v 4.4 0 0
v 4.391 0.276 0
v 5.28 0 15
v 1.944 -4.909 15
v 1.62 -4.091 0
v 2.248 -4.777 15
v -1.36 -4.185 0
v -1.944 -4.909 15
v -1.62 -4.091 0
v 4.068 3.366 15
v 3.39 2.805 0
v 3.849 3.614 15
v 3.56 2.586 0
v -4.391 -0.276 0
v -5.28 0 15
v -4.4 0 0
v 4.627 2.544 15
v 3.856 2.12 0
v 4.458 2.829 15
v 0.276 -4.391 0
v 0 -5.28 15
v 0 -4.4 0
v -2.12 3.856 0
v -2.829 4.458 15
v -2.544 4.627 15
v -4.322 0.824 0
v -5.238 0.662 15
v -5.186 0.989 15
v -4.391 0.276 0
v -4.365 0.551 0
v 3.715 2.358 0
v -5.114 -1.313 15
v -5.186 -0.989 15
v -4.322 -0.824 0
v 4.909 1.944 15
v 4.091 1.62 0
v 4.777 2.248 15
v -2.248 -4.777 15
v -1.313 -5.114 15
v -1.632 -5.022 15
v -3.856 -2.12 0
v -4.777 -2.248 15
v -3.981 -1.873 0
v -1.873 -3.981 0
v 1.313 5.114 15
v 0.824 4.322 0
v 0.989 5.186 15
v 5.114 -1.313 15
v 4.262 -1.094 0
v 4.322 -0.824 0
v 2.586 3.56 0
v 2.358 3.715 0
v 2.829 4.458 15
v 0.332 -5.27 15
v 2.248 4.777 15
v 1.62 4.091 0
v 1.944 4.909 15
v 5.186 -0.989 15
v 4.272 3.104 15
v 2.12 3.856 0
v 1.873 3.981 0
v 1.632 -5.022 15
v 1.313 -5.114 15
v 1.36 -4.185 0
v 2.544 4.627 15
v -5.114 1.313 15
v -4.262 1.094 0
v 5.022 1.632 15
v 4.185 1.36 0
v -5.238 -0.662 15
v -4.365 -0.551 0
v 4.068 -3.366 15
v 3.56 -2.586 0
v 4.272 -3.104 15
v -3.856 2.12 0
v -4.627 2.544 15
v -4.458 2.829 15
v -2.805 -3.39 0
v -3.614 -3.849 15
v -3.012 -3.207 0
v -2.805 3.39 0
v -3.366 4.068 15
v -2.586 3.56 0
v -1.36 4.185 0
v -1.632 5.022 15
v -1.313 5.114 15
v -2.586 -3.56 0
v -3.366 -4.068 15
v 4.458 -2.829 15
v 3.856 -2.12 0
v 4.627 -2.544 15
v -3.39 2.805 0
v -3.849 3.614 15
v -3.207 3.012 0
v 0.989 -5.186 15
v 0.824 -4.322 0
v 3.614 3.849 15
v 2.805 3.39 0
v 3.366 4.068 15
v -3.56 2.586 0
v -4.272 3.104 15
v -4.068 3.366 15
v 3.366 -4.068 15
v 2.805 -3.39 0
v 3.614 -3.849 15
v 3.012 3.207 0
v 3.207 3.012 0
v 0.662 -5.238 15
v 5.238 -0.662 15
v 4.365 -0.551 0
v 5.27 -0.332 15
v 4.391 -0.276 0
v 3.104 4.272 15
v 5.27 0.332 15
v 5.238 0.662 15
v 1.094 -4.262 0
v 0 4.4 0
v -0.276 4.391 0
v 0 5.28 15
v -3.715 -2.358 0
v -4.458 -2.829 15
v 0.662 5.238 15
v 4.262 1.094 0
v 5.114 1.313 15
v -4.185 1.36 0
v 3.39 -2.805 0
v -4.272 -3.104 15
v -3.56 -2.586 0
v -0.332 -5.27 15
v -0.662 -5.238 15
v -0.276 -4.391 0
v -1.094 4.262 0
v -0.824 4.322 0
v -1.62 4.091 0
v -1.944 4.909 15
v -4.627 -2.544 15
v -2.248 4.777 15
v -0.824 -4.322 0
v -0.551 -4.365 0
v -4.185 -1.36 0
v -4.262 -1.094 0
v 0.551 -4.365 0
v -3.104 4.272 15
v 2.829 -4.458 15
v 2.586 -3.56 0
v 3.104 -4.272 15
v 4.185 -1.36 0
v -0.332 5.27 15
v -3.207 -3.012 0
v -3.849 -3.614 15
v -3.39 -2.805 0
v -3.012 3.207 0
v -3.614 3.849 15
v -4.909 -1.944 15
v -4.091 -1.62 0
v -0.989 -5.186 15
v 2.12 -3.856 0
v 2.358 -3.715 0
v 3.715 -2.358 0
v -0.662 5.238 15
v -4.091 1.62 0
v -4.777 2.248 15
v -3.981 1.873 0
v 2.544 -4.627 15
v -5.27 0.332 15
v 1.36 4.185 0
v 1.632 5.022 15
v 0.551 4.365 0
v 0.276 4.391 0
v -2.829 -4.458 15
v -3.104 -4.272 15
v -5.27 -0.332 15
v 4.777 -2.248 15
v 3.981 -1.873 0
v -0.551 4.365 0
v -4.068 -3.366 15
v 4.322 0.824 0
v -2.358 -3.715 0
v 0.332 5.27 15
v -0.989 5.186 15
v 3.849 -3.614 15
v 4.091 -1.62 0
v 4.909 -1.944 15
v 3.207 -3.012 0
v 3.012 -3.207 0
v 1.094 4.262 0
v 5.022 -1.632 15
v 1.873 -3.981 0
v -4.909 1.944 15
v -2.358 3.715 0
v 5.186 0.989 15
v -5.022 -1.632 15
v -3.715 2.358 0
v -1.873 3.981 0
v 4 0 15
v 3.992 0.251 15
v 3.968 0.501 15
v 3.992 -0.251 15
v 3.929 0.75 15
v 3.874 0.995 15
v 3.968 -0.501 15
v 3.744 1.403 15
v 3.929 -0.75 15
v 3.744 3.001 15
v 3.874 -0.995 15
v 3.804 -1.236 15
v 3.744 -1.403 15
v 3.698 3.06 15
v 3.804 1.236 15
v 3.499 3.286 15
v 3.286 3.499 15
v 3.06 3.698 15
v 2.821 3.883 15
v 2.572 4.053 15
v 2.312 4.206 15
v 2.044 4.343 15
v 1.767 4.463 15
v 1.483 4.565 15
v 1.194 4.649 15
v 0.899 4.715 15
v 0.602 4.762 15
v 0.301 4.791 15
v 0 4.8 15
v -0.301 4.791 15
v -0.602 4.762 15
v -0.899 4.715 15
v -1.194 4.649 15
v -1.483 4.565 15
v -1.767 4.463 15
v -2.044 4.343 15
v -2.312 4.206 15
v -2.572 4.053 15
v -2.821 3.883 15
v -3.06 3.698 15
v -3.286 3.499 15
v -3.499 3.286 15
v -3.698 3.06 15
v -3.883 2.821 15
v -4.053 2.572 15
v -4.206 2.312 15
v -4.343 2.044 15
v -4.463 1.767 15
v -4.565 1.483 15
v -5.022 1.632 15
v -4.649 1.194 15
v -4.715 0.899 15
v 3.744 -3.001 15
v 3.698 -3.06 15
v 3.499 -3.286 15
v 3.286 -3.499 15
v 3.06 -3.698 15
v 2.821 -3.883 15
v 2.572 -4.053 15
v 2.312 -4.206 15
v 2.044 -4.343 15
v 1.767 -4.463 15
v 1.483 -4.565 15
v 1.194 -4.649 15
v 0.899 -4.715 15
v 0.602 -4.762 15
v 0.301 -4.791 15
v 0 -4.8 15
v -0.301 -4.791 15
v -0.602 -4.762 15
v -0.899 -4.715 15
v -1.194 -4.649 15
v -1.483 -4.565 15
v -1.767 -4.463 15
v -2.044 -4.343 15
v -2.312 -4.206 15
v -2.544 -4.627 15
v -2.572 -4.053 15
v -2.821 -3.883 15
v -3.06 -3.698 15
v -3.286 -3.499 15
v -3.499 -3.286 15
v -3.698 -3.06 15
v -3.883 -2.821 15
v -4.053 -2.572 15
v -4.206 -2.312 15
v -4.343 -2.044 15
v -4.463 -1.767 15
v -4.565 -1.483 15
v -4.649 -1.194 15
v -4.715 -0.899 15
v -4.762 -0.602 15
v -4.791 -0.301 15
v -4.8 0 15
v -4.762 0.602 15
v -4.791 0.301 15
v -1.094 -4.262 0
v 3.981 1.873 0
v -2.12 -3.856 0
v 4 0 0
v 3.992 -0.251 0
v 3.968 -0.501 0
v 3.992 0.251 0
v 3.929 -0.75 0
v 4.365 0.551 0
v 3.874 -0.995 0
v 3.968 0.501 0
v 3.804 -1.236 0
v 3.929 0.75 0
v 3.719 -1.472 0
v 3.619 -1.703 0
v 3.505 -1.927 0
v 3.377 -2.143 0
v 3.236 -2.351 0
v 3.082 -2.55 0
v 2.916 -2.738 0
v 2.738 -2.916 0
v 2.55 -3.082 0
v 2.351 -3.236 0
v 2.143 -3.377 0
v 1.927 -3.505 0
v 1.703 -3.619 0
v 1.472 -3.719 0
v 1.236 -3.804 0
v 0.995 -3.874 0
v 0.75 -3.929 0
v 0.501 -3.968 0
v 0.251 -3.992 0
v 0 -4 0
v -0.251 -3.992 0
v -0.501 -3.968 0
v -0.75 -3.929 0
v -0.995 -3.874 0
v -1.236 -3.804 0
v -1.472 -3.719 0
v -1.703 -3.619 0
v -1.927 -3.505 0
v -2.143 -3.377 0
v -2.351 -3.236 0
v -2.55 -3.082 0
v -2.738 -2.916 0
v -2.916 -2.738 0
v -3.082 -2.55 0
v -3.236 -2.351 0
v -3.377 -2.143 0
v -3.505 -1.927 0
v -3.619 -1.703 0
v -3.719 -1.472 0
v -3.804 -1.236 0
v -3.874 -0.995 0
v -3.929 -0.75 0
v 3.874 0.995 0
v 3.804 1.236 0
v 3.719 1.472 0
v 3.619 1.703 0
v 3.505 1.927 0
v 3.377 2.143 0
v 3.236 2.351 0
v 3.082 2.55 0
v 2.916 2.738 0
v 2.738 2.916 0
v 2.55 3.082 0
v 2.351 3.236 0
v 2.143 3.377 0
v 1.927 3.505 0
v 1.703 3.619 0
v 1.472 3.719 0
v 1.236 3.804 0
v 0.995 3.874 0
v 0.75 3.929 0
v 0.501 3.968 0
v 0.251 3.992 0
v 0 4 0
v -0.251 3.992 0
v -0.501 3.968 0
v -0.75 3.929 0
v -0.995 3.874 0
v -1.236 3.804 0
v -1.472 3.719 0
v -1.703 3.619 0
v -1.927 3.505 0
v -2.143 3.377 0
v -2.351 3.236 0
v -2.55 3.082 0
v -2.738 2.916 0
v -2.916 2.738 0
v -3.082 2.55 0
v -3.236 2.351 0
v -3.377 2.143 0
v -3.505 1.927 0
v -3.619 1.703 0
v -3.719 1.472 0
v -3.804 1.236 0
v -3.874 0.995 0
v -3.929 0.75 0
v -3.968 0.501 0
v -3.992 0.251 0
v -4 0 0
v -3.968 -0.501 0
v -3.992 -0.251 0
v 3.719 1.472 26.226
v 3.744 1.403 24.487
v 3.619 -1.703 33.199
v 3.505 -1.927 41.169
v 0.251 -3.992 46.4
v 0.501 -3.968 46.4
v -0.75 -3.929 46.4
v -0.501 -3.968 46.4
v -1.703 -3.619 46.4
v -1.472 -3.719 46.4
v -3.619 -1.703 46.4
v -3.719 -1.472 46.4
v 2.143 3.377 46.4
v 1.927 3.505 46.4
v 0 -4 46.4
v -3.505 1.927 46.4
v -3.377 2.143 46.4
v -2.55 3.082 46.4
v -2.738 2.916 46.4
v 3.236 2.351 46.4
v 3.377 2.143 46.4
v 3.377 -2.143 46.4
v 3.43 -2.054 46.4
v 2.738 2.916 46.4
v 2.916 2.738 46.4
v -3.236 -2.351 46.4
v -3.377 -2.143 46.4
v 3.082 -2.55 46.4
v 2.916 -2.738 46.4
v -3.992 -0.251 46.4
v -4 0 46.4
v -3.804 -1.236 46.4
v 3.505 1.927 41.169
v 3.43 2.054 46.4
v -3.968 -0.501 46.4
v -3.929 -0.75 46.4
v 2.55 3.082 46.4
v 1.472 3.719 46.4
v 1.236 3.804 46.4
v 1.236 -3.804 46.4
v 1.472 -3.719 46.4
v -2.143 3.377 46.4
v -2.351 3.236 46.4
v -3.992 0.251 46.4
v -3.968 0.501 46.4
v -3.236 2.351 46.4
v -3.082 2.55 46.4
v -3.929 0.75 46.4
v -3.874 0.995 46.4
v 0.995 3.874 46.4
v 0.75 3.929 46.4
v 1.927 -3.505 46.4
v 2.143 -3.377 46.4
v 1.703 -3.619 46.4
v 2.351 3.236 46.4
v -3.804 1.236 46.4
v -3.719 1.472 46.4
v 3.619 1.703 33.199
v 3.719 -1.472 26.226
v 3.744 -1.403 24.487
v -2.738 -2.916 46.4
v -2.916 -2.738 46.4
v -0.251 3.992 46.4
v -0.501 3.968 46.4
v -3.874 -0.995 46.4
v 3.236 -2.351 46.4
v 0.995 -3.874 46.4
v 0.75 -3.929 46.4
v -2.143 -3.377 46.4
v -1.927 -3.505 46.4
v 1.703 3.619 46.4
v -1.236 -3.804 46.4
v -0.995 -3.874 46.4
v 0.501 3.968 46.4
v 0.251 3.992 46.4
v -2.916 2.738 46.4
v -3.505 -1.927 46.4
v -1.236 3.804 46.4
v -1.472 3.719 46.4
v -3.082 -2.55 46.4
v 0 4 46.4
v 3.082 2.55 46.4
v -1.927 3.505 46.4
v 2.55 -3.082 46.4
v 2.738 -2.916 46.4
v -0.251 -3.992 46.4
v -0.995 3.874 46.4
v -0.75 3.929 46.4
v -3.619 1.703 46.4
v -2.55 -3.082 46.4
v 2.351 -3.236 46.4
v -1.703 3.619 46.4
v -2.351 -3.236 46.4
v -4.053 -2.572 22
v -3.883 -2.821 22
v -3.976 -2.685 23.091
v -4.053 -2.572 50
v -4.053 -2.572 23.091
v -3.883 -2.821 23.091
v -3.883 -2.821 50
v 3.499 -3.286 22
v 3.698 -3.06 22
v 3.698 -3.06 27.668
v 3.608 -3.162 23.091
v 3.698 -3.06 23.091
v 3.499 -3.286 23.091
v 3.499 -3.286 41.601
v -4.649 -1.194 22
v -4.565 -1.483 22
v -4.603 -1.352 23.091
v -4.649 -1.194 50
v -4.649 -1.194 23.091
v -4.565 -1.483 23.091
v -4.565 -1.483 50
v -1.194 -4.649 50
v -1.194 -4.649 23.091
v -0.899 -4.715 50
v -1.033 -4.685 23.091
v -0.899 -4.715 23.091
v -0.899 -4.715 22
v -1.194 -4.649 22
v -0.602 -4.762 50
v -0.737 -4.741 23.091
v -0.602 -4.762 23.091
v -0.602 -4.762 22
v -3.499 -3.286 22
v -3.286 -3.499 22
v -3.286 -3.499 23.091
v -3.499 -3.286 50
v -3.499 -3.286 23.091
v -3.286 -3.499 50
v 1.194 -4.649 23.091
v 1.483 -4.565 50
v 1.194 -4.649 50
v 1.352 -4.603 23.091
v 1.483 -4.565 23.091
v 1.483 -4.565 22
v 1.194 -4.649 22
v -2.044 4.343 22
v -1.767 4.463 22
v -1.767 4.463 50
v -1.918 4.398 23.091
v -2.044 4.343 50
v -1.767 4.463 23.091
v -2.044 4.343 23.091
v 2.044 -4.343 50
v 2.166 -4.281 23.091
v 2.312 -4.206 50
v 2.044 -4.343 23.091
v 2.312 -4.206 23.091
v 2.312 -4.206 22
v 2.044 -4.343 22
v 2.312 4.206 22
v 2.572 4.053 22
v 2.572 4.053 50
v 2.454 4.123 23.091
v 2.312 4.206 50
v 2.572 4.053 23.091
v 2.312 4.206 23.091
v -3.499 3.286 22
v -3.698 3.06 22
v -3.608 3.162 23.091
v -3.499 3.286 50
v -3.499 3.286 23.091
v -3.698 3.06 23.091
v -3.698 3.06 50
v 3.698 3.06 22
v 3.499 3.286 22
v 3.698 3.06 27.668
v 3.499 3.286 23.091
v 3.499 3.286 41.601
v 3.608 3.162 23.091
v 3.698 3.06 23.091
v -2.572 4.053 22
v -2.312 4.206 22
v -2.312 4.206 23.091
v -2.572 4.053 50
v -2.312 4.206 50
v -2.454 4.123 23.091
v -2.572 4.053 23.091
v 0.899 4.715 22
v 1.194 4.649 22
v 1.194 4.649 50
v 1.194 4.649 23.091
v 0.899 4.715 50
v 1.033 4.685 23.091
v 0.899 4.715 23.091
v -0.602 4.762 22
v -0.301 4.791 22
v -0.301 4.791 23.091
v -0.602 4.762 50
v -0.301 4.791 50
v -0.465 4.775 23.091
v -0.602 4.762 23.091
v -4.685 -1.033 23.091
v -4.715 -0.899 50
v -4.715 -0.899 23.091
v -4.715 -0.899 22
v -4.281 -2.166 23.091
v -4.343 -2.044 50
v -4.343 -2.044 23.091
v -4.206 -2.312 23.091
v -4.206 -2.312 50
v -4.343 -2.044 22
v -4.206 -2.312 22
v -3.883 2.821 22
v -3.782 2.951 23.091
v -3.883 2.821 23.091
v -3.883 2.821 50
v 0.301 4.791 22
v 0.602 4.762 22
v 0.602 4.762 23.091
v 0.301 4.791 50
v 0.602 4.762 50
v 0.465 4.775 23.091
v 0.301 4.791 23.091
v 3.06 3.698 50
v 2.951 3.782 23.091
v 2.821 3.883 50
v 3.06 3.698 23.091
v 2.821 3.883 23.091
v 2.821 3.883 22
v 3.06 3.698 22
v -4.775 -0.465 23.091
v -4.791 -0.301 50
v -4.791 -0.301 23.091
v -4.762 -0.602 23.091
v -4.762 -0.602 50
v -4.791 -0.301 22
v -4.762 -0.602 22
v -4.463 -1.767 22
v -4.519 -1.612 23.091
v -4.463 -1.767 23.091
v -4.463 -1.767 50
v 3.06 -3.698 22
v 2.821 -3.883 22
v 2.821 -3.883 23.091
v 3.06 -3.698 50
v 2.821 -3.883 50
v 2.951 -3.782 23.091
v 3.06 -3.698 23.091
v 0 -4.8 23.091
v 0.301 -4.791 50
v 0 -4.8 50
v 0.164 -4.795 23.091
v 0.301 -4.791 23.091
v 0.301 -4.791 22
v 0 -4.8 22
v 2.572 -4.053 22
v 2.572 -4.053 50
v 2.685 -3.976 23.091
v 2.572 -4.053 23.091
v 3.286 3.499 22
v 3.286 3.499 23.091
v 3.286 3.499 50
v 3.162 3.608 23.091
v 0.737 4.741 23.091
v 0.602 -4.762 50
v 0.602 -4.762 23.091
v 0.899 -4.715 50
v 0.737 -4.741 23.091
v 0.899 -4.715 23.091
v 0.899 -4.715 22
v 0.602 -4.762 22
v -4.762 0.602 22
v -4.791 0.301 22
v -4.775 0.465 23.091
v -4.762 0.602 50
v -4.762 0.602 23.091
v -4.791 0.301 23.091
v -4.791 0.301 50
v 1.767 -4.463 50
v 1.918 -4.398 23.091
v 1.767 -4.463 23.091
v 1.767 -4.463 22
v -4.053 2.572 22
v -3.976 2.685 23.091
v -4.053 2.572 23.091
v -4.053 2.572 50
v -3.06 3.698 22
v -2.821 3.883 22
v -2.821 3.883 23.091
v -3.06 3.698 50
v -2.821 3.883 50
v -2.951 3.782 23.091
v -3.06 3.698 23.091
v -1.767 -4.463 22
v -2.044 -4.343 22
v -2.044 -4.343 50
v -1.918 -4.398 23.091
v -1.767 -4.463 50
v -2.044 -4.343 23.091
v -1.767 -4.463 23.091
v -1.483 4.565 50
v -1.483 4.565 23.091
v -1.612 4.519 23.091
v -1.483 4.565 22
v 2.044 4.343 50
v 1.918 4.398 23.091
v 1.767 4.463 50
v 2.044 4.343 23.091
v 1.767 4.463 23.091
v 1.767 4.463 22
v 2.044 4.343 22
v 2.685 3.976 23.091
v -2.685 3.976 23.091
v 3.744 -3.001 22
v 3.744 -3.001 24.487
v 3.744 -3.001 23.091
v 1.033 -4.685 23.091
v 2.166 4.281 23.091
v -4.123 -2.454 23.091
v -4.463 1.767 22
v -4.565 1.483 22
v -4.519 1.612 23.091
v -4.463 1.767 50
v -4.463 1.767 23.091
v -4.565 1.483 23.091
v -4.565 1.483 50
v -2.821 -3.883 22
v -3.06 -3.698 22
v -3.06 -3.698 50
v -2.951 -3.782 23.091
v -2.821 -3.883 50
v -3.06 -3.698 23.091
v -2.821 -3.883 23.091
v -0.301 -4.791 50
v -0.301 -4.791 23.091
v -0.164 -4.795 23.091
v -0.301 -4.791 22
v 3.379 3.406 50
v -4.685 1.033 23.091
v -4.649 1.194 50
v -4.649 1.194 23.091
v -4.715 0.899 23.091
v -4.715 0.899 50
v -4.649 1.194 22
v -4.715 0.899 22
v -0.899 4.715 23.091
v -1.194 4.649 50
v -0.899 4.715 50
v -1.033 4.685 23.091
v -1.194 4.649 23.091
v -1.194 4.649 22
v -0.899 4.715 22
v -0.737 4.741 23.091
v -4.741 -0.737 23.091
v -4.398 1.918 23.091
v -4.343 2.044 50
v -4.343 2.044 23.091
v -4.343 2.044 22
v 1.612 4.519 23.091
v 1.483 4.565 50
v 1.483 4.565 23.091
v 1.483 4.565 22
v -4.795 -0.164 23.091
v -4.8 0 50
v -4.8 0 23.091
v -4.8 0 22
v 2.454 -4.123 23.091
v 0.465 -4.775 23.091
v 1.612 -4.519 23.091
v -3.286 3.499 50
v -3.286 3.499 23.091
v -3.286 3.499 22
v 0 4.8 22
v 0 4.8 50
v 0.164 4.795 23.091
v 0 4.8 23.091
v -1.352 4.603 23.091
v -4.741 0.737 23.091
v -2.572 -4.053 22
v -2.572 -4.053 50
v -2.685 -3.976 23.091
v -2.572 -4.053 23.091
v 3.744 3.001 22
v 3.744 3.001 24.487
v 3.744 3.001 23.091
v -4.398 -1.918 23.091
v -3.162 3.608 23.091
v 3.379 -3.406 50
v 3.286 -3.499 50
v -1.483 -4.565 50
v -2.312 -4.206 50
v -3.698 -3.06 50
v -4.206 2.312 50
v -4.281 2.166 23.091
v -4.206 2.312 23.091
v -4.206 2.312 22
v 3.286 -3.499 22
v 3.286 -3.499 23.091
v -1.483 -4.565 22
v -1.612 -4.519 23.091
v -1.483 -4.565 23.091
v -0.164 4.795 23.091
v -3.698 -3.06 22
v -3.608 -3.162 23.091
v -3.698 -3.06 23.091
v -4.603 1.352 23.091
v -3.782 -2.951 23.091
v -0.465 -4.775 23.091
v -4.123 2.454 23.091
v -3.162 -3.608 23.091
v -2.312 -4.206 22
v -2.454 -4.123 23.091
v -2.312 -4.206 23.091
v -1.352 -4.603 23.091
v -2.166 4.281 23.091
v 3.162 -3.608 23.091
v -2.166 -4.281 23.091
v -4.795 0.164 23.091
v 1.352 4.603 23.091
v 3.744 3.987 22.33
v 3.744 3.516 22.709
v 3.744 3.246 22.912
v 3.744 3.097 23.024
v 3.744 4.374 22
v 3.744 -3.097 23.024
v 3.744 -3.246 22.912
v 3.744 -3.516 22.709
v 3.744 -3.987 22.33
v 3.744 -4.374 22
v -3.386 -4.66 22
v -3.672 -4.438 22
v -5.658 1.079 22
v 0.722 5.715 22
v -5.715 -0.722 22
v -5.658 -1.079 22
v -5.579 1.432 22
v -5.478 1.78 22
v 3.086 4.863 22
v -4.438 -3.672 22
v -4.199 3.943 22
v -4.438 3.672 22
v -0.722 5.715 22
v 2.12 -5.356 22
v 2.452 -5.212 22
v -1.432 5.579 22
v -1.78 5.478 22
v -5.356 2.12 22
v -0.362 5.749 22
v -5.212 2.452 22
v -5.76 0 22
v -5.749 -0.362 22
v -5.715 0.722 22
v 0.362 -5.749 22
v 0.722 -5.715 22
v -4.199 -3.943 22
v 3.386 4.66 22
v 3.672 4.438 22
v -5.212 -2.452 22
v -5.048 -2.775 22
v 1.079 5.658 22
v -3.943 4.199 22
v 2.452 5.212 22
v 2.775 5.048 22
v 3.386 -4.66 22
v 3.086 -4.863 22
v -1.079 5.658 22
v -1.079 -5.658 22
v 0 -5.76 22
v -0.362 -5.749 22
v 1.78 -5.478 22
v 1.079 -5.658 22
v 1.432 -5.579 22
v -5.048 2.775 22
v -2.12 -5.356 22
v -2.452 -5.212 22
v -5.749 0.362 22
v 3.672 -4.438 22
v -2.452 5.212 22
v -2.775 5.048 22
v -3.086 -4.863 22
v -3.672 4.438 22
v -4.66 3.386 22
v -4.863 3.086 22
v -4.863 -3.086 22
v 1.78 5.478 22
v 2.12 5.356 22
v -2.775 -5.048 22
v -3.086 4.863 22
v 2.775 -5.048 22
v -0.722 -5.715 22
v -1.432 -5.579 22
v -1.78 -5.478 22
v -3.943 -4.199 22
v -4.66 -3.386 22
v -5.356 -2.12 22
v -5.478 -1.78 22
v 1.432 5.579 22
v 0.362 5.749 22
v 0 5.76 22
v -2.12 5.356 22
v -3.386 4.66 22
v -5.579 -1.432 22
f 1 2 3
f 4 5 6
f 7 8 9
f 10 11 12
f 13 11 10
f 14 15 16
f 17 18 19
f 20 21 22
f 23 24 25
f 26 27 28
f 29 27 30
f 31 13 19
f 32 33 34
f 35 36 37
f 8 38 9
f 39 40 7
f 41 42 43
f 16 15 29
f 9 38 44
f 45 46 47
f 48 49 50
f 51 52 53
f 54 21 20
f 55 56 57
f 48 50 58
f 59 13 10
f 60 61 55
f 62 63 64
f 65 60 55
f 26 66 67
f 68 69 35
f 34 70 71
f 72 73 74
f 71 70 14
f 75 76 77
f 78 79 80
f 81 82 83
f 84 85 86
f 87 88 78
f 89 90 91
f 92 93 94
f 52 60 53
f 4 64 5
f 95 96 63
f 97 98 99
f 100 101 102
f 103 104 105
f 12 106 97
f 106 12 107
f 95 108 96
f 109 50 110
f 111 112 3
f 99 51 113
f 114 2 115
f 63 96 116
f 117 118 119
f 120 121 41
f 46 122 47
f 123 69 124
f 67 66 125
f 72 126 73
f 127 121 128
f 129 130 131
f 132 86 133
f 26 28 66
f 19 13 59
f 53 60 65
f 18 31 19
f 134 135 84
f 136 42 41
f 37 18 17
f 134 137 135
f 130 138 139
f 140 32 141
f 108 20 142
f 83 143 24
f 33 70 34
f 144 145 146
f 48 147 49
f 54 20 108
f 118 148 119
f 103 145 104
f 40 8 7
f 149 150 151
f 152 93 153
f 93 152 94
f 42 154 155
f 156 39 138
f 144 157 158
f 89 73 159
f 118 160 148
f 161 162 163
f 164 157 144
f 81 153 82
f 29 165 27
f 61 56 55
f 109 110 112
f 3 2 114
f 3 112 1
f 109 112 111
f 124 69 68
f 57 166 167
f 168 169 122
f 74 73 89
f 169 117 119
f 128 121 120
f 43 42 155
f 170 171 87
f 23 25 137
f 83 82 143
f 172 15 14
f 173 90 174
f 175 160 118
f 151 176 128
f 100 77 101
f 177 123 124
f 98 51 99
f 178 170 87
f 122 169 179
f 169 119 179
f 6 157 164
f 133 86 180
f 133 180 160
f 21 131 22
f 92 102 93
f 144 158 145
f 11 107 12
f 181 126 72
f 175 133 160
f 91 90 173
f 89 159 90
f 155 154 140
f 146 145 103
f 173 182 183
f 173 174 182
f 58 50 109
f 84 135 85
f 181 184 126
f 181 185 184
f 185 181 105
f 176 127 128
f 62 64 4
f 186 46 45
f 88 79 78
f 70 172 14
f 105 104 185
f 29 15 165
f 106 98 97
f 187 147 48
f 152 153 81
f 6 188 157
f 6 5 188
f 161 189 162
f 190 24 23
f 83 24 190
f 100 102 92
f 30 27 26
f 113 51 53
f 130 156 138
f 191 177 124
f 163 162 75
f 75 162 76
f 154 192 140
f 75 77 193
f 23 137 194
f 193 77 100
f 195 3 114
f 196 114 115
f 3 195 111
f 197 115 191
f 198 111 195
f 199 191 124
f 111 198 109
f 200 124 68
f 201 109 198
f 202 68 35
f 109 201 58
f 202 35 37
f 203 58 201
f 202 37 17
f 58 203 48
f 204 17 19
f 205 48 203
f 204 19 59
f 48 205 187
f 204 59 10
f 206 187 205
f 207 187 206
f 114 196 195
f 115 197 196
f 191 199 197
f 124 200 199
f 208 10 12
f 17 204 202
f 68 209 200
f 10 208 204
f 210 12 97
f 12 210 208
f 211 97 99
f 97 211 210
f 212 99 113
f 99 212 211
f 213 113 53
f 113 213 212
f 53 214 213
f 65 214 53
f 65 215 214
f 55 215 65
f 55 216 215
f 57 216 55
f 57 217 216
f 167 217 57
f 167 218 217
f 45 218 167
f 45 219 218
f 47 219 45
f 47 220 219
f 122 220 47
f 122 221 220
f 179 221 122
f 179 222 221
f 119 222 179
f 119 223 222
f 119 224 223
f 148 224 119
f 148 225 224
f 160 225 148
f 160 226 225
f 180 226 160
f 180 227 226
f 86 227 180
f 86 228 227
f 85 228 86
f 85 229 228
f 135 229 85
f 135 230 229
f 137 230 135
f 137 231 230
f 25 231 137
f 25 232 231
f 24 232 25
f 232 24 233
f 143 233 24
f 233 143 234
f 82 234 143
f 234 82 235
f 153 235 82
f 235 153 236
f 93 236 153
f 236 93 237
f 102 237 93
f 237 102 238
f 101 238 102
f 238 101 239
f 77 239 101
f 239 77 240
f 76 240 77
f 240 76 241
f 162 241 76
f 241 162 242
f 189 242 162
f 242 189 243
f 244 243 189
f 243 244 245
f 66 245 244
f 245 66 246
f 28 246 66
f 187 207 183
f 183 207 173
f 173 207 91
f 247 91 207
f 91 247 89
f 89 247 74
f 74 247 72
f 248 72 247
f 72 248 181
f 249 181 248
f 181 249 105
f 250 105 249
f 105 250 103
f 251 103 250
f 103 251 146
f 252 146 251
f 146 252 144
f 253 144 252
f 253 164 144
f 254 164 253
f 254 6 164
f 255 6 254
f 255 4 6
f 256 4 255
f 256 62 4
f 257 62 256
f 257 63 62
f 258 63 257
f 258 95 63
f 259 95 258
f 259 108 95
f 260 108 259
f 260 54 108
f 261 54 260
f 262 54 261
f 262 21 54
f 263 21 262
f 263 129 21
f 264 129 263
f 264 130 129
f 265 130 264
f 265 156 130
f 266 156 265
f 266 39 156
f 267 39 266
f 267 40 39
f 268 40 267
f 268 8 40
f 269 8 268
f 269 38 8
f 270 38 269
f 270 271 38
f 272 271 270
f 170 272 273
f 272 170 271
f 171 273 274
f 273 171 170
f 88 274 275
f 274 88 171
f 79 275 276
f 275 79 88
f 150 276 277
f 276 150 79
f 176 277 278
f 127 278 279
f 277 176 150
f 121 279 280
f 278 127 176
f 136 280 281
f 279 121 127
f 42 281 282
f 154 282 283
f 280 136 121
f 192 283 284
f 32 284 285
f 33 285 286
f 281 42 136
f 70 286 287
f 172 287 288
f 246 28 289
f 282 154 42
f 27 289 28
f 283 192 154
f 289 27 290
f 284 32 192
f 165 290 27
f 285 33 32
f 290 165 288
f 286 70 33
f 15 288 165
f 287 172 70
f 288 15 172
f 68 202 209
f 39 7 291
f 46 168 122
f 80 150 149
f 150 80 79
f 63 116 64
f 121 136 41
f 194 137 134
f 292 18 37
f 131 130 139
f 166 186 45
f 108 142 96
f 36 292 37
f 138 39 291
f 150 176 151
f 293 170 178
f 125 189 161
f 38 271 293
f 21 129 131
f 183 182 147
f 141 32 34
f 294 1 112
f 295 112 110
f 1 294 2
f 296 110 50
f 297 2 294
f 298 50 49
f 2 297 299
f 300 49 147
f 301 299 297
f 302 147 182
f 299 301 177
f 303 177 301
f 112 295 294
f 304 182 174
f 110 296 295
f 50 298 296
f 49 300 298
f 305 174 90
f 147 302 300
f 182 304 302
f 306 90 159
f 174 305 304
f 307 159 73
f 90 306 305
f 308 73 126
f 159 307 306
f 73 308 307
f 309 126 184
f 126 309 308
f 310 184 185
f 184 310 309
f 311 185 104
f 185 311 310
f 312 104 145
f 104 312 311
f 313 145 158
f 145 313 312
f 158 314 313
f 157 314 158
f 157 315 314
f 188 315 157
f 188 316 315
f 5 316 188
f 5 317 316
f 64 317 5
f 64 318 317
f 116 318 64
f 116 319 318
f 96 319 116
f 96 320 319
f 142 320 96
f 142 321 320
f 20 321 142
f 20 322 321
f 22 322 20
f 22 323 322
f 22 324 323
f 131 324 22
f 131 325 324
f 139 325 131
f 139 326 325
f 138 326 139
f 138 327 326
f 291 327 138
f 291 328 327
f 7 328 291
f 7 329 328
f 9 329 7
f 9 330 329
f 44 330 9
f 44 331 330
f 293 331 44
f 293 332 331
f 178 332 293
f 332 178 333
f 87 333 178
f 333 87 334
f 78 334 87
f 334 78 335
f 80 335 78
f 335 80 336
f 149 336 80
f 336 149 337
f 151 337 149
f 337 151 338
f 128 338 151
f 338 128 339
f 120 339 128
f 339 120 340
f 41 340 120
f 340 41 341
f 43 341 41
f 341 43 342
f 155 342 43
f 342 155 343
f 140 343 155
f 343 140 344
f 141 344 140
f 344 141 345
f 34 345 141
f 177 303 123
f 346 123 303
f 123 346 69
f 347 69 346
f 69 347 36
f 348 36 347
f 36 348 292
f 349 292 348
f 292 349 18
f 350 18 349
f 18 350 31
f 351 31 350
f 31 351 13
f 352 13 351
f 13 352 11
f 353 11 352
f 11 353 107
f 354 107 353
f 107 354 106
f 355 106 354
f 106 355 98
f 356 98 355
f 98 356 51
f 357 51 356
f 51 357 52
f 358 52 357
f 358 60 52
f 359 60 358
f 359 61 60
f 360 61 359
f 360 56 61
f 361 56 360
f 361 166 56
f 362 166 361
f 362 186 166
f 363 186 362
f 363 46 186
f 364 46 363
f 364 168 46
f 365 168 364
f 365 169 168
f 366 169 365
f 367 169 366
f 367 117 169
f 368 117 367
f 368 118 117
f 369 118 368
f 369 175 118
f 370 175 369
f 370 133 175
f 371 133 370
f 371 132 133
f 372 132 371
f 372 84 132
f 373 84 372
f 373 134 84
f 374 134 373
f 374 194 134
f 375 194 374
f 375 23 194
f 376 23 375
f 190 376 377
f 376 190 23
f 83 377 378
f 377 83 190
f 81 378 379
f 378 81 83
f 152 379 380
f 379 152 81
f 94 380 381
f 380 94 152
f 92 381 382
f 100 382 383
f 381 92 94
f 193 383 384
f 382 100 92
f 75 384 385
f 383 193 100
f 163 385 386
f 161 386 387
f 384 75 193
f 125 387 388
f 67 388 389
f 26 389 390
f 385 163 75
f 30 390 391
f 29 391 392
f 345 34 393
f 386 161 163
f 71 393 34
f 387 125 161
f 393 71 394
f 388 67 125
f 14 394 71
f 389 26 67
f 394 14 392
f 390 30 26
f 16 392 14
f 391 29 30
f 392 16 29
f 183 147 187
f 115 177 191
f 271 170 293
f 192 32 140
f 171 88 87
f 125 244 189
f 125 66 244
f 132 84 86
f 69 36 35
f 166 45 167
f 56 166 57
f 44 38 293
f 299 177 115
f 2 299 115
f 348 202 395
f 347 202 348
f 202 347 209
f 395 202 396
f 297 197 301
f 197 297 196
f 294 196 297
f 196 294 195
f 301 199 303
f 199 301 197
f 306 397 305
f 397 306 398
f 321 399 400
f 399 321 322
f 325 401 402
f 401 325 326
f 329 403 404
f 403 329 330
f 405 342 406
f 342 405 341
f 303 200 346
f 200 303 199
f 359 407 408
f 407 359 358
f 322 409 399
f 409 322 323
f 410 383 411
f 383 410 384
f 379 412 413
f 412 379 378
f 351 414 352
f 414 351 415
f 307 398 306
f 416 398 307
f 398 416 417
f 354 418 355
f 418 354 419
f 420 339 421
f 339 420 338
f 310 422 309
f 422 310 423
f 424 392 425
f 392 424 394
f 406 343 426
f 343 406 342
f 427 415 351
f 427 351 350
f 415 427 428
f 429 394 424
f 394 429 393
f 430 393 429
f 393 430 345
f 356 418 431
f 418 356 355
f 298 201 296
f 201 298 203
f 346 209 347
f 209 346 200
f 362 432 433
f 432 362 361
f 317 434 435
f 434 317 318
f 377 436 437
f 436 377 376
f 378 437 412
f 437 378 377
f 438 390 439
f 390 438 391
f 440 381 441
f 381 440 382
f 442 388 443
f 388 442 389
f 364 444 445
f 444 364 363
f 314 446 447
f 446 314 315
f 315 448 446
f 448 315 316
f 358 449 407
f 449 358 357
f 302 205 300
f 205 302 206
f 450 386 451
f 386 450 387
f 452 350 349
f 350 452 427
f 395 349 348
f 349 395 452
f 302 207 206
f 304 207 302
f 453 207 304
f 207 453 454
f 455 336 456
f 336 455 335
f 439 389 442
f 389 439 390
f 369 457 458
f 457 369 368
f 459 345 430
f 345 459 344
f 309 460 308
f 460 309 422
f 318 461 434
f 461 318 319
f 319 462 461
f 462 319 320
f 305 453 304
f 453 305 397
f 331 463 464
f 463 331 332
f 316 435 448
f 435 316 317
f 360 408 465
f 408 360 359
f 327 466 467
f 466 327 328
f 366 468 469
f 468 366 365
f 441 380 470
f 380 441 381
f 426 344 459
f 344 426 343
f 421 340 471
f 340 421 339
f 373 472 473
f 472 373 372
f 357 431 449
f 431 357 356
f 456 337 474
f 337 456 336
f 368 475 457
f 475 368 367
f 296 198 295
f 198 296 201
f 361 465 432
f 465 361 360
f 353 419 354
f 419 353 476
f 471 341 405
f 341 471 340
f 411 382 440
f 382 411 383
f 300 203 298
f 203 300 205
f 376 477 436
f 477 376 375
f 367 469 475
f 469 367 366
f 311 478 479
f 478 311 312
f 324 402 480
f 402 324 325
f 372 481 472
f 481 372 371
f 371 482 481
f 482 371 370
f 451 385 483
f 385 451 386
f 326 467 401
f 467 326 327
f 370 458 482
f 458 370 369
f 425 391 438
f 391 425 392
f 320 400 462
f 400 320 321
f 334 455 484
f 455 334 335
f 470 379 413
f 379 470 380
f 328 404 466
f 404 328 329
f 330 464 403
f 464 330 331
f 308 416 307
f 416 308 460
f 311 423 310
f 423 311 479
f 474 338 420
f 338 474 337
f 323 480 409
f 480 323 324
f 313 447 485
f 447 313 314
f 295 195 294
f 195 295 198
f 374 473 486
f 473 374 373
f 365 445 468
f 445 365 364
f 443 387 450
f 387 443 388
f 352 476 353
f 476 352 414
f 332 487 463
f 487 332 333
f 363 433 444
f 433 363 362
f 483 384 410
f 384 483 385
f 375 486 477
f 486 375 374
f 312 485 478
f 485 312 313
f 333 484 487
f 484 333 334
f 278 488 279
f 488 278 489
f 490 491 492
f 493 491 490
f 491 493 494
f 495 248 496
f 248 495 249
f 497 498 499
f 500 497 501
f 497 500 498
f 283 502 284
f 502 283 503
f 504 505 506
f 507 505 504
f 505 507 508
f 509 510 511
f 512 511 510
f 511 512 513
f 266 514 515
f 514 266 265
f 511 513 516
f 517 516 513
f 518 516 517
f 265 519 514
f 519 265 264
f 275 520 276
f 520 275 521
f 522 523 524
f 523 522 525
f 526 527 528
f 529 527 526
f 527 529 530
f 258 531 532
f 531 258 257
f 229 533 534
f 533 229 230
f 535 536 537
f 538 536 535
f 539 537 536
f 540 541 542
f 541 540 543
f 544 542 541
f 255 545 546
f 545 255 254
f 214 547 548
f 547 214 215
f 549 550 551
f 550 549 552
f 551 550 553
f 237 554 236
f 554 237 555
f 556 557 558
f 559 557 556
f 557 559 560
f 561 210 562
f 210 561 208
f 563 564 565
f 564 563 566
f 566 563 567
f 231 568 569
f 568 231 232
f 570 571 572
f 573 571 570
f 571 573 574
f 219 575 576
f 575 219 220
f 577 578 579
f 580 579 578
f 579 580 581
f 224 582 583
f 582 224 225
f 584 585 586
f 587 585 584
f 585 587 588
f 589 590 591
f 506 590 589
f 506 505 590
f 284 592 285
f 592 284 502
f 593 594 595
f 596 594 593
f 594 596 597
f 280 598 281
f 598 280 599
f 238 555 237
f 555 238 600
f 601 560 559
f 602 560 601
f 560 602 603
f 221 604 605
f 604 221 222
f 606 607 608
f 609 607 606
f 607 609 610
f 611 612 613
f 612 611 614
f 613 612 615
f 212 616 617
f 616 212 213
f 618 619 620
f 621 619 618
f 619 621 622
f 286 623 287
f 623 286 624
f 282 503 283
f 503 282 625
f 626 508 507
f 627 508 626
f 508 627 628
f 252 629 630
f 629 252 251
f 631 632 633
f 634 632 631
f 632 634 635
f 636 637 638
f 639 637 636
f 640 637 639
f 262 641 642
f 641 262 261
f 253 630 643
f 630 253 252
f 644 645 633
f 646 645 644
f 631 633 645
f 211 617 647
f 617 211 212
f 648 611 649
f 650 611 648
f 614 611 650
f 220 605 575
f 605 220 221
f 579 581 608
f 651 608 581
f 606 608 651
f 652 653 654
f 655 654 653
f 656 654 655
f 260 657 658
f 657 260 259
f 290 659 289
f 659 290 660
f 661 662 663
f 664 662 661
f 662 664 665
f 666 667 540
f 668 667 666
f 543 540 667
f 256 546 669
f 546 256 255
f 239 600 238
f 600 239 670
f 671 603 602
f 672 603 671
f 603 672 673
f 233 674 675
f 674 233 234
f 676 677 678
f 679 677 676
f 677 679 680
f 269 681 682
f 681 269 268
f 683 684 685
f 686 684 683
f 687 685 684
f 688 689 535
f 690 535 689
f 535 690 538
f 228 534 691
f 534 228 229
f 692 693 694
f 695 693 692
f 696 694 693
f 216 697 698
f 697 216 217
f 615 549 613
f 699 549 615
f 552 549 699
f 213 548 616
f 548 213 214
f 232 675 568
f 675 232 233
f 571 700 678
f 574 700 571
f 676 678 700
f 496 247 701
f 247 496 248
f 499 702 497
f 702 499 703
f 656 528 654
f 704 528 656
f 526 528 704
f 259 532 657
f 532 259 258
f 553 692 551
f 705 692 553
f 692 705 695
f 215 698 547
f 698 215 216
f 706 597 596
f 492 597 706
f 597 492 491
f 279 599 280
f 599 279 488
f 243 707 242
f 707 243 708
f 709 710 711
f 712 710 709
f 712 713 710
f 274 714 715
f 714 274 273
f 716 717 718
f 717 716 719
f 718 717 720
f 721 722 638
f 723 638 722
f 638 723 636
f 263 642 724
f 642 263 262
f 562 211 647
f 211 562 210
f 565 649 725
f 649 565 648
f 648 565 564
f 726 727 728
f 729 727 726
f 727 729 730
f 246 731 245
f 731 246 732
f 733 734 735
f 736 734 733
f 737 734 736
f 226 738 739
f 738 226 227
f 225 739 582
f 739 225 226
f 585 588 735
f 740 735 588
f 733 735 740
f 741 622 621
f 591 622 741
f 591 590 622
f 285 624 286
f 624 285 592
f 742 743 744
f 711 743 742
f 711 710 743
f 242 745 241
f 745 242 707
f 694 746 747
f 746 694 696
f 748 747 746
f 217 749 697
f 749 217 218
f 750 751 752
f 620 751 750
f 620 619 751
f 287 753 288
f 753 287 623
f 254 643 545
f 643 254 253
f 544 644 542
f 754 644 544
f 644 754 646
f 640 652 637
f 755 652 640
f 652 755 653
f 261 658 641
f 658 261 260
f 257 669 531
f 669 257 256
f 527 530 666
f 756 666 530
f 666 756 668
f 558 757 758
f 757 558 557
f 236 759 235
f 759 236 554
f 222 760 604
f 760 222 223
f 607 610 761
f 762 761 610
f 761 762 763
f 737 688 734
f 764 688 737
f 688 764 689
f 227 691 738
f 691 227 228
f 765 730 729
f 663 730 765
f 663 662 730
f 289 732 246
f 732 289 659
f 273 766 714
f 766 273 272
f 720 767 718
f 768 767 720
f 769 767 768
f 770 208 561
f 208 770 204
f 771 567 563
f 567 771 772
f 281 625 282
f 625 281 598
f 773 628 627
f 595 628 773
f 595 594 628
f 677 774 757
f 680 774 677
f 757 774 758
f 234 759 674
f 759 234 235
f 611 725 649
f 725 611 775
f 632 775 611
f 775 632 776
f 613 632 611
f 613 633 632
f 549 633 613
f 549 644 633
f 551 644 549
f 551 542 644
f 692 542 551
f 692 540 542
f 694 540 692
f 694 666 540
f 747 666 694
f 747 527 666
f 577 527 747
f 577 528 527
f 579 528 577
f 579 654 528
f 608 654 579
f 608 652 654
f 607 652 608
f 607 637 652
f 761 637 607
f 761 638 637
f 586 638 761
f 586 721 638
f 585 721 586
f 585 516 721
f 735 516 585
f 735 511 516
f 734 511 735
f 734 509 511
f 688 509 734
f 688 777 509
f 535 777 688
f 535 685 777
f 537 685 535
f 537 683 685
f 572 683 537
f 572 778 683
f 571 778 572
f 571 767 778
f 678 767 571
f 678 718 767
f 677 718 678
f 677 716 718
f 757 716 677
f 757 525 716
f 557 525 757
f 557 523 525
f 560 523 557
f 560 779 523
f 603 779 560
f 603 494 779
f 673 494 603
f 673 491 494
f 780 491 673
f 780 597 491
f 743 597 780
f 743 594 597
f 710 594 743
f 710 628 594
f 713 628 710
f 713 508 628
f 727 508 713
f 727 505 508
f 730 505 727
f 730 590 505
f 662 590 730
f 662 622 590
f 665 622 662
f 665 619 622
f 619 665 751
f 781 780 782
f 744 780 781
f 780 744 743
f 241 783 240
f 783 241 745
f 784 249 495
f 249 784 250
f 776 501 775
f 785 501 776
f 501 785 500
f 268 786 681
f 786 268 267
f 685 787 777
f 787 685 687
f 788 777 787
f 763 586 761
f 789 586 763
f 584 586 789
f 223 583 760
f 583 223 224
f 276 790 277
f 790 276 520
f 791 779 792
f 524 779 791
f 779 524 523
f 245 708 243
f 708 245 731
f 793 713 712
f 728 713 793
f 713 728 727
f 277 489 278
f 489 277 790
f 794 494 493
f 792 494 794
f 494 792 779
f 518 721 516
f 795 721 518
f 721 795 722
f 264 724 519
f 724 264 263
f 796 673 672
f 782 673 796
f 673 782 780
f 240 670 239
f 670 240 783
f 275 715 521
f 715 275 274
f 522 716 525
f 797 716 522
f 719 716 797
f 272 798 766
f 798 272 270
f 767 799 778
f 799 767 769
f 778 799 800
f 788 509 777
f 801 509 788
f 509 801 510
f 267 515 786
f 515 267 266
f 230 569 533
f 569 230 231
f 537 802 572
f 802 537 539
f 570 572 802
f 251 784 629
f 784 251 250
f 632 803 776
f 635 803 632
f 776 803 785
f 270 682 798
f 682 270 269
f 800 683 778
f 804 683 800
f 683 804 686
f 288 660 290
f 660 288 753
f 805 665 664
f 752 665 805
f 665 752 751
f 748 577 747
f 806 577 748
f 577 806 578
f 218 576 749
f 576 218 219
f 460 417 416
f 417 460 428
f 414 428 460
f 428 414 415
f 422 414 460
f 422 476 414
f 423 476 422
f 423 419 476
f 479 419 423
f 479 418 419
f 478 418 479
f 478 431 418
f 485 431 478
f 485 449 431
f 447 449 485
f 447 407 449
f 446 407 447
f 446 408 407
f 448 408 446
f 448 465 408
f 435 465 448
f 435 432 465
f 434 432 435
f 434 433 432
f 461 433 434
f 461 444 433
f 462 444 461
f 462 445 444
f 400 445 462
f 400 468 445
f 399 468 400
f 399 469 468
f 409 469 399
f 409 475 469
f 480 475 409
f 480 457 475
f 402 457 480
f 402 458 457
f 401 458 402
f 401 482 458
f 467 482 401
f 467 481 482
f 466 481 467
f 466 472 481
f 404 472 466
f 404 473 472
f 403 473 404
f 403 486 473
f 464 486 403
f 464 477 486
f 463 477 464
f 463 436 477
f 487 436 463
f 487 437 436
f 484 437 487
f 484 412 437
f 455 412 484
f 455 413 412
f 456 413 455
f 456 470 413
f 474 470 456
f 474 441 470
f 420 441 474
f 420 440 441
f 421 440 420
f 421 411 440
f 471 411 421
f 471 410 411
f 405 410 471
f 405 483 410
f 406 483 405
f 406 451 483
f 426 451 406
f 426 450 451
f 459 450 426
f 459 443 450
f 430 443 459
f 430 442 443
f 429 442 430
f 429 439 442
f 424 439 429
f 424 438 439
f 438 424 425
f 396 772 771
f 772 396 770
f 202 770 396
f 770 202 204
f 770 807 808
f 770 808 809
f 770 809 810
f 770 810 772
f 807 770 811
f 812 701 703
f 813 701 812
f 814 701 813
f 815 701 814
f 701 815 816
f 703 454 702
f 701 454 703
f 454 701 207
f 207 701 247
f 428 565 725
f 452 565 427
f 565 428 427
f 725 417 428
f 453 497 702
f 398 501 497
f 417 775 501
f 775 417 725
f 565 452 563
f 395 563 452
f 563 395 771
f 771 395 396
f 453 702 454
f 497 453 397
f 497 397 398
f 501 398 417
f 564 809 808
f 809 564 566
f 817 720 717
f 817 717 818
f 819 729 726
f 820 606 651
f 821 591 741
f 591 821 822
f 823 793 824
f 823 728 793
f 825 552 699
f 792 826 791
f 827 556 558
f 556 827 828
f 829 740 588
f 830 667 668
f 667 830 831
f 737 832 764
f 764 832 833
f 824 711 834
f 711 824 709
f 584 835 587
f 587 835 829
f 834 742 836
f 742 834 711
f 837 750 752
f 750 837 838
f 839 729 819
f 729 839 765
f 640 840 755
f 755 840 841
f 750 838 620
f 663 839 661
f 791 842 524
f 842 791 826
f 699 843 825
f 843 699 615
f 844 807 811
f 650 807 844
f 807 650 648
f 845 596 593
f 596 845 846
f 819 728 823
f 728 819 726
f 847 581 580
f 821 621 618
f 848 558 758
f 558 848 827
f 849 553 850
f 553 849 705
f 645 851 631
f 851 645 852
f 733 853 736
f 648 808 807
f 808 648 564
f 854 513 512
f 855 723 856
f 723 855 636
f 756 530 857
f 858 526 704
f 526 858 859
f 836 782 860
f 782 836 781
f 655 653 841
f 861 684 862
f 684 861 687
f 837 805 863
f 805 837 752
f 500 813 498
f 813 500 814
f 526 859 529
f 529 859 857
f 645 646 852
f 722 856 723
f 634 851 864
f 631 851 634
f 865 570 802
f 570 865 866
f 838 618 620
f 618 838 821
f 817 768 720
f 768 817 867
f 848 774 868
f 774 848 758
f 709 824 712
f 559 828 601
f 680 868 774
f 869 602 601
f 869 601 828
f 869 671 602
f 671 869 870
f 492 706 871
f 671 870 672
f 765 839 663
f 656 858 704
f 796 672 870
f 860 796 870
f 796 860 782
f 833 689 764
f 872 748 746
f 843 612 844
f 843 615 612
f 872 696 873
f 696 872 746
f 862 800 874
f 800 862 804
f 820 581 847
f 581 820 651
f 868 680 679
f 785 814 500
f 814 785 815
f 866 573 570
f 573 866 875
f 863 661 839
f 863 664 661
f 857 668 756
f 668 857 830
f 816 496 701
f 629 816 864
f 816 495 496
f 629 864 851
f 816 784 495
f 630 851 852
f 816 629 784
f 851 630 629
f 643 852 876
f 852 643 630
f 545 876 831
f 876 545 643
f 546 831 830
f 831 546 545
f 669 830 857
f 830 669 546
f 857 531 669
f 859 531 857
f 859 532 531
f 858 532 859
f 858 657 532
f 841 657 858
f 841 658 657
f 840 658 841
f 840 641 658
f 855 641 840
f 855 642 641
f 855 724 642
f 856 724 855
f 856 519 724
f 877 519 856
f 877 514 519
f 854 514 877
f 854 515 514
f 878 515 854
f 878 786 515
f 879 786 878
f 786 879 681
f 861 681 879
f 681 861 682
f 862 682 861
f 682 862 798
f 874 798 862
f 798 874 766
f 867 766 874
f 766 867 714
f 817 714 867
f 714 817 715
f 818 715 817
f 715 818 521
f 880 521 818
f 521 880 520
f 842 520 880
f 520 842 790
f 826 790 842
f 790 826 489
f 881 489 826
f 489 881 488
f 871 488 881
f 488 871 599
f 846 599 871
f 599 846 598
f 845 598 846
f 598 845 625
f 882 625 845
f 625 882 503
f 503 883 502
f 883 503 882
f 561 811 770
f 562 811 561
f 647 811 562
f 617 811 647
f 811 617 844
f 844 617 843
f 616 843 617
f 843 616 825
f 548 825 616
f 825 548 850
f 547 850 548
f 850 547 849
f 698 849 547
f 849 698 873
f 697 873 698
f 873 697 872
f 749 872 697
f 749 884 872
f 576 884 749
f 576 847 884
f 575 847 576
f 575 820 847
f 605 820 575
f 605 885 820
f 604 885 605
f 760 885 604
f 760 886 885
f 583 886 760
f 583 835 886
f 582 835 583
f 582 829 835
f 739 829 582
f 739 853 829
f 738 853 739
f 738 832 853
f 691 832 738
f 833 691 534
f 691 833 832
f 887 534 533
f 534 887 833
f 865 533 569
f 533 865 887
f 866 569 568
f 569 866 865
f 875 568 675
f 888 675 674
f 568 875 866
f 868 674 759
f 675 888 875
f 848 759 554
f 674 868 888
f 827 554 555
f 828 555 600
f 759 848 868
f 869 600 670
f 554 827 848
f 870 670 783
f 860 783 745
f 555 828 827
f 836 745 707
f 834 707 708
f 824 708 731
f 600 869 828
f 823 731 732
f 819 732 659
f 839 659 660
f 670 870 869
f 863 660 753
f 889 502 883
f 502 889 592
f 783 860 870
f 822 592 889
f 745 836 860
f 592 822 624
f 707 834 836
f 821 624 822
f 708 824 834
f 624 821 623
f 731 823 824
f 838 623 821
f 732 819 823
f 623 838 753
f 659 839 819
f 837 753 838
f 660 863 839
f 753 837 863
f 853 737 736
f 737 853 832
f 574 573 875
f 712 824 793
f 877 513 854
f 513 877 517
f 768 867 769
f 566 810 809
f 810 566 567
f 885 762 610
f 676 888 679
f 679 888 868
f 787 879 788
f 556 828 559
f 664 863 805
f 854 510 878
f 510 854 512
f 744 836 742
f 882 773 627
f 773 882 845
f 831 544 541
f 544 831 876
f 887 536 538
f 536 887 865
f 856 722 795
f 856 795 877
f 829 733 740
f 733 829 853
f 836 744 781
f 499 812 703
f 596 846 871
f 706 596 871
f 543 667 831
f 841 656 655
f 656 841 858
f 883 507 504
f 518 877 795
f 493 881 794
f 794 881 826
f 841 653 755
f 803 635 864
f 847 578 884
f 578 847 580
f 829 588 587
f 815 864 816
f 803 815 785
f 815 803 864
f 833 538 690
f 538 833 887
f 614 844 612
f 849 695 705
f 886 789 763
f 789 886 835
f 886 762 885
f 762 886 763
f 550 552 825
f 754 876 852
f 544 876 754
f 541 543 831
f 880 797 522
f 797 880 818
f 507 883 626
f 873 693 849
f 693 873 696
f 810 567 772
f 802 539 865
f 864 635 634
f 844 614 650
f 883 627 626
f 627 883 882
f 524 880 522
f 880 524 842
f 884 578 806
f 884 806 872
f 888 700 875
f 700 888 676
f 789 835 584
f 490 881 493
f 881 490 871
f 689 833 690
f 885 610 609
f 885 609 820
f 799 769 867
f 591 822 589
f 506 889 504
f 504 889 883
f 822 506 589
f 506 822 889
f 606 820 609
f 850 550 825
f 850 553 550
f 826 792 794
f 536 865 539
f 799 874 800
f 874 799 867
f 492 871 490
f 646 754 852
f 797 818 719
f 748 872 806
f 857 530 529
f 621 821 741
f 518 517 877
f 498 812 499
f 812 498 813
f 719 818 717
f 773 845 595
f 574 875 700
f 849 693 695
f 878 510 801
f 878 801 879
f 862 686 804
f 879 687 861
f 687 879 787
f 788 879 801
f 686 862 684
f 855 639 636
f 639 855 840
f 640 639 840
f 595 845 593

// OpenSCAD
// file: reed/BOSL2/std.scad
// Minimal BOSL2 compatibility shim for bundled gallery models.
// It implements only the helpers used by the imported OpenSCAD projects.

CENTER = [0, 0, 0];
BOTTOM = [0, 0, -1];
TOP = [0, 0, 1];
LEFT = [-1, 0, 0];
RIGHT = [1, 0, 0];
FRONT = [0, -1, 0];
BACK = [0, 1, 0];

module up(z=0) {
    translate([0, 0, z]) children();
}

module down(z=0) {
    translate([0, 0, -z]) children();
}

module attach(anchor=CENTER) {
    children();
}

module cuboid(size=[1, 1, 1], anchor=CENTER) {
    center = anchor == CENTER;
    translate(center ? [0, 0, 0] : [0, 0, size[2] / 2])
        cube(size, center=true);
    children();
}

module xcyl(h=1, r=1, anchor=CENTER) {
    center = anchor == CENTER;
    translate(center ? [0, 0, 0] : [h / 2, 0, 0])
        rotate([0, 90, 0])
            cylinder(h=h, r=r, center=true);
}
// file: reed/reed.scad
use <BOSL2/std.scad>

holder_completeness_percent = 33;

module pipe(length, outer_diameter, thickness, cap=0, center=true){
    if(cap == 0){
        difference(){
            cylinder(h=length, d=outer_diameter, center = center);
            translate([0,0,-0.1*length]) cylinder(h=length*1.3, d=outer_diameter-thickness*2, center = center);
        }
    } else {
        difference(){
            cylinder(h=length, d=outer_diameter, center = center);
            translate([0,0,-cap]) cylinder(h=length, d=outer_diameter-thickness*2, center = center);
        }
    }
}

module partial_pipe(length, outer_diameter, thickness, completeness_percent=33){
    echo(str("partial_pipe(", length, ", ", outer_diameter, ", ", thickness, ", ", completeness_percent));
    difference(){
        rotate_extrude(angle=completeness_percent*360/100, convexity = 2){
            translate([0.01, 0, 0]) square([outer_diameter/2 - 0.01, length], center = false);
        }
        translate([0,0,-0.1*length]) cylinder(h=length*1.2,d=outer_diameter - thickness*2, center = false);
    }
}

module reed_burdon_ending(total_length, end_length, d) {
    // pogrubienie przy mocowaniu
    translate([0,0,-end_length]){
        flute_count = 5;
        union() {
            difference() { // stożek
                cylinder(h=end_length,r2=d/2,r1=d/2*0.75,center=false);
                translate([0,0,-end_length*0.05]) cylinder(h=end_length*1.1,r2=d/2*0.8,r1=d/2*0.65,center=false);
            }
            // for(i=[1:flute_count]){ //karbowanie
            //     translate([0,0,(i-1)*end_length/flute_count]){
            //         pipe(length=end_length/flute_count/2, outer_diameter=d*lerp(0.80, 1.1, i/flute_count), thickness=0.6, center=false);
            //         // echo(i*end_length/flute_count);
            //     }
            // } //karby
        } // karbowanie
    } // pogrubienie
}

module reed_ending(total_length, end_length, d) {
    wall_thickness = d * 0.11;
    translate([0,0,-end_length]){
        flute_count = 5;
        union() {
            difference() { // stożek
                cylinder(h=end_length,r1=d/2-wall_thickness+0.4,r2=d/2);
                translate([0,0,-end_length*0.05]) cylinder(h=end_length*1.1,r1=d/2-wall_thickness,r2=d/2-wall_thickness);
            }
            // for(i=[1:flute_count]){ //karbowanie
            //     translate([0,0,(i-1)*end_length/flute_count]){
            //         pipe(length=end_length/flute_count/2, outer_diameter=d+2*wall_thickness, thickness=0.6, center=false);
            //         // echo(i*end_length/flute_count);
            //     }
            // } //karby
        } // karbowanie
    } // pogrubienie
}

module reed_base(total_length, end_length, d){
    translate([0, 0, end_length]) {
        // główny cylinder
        cylinder(h=total_length - end_length, d=d);
        reed_ending(total_length, end_length, d);
    } // wyrównanie po dodaniu końcówki
}
// file: variants-reed-pipe.scad
variants_reed_pipe_length = 50;
variants_reed_pipe_fastener_length = variants_reed_pipe_length * 0.13;
variants_reed_pipe_end_length = 15;
variants_reed_pipe_in_diameter = 8;
variants_reed_pipe_wall_thickness = 0.8;
variants_reed_pipe_cut_prcnt = 11;
variants_reed_pipe_leaf_degree = 1.64; // had a case when the leaf curled up, and become too difficult to play. 1.66 gives lower tone!


// leaf only
// variants_leaf_thickness = 0.4;
variants_leaf_enforcement_square_coeff = 0.000;
variants_leaf_enforcement_linear_coeff = 0.04;
variants_leaf_enforcement_const_coeff = 0.4;
variants_leaf_enforcement_support_stem_height = 0;
// file: reed/reed_2_0_0.scad
include <reed.scad>

completeness_percent = 25;
wall_thickness = 0.8;
reed_plug_overhang_suppressor_len = 2;
eps = 0.01;

module reed_plug(total_length, end_length, d) {
    d_out = d+wall_thickness*2;

    translate([0,0,-end_length]){
        difference() {
            cylinder(h=end_length,d2=d_out*1.1,d1=d+0.8);
            translate([0,0,-eps/2]) cylinder(h=end_length+eps,d=d);
        }
    }

    // // anti overhanger
    // translate([0,0,0]) {
    //     difference() {
    //         cylinder(h=reed_plug_overhang_suppressor_len,d1=d_out*1.1,d2=d+0.8);
    //         translate([0,0,-eps/2]) cylinder(h=2+eps,d=d);
    //     }
    // }
}

module reed2_base(total_length, end_length, d){
    d_out = d+wall_thickness*2;
    translate([0, 0, end_length]) {
        difference() {
            cylinder(h=total_length - end_length, d=d_out);
            translate([0, 0, -0.1]) cylinder(h = (total_length - end_length)*0.9, d = d);
        }
    } 
}

module reed2_leaf_socket(heigth_cut_prcnt, d, total_length) {
    d_out = d+wall_thickness*2;
    // deepens the cut, for more secure leaf hold
    translate([-heigth_cut_prcnt/120 * d_out, 0, 0]) cube(size=[heigth_cut_prcnt/50 * d_out * 1.1, d_out*1.1, total_length * 0.1]);
}

module reed2_base_flat_cutting_cube(d, heigth_cut_prcnt, total_length) {
    d_out = d+wall_thickness*2;
    translate([d_out/2 - d_out * heigth_cut_prcnt / 100, -d_out/2, 0.25 * total_length]) {
        cube(size=[d_out, d_out, total_length * 0.80]);
        // reed2_leaf_socket(heigth_cut_prcnt, d, total_length);
    }
}

module reed2_base_flat_cut(total_length, end_length, d, heigth_cut_prcnt) {
    difference(){
        reed2_base(total_length, end_length, d);
        translate([0,0,-0.5]) reed2_base_flat_cutting_cube(d, heigth_cut_prcnt, total_length+2/*a gap for reed fitting*/);
    }
}

module reed2_cut(total_length, d, heigth_cut_prcnt, leaf_degree) {
    d_out = d+2*wall_thickness;
    translate([d_out/2 - d_out * heigth_cut_prcnt / 100 + 0.1/*<- fill the little gap between leaf and reed*/, -d_out/2, 0.35 * total_length]) {
        rotate([0, -leaf_degree, 0]) rotate([180, 90, -90]) {
            rotate_extrude(angle = leaf_degree, $fn=100) {
                rotate([0, 0, 90]) {
                    square([d_out, total_length * 0.70]);
                }
            }
        }
    }
}

module reed2_leaf(total_length, end_length, d, heigth_cut_prcnt, stem_heigth_coeff_init, stem_heigth_coeff) {
    d_out = d+2*wall_thickness;
    leaf_len = (total_length - end_length)*0.9;
    
    // trunk of the leaf ;)
    translate([-d*0.15,0,0]) intersection(){
        cylinder(h=total_length * 0.94, d=d_out*1.25);
        reed2_base_flat_cutting_cube(d_out, heigth_cut_prcnt, total_length);
    }

    // support stem
    translate([d_out/2+leaf_len*stem_heigth_coeff_init/2-d*0.1/2, 0, end_length]) rotate([0,-atan(stem_heigth_coeff_init-stem_heigth_coeff),0]) rotate([0,0,-120]) cylinder(leaf_len, leaf_len*stem_heigth_coeff_init, leaf_len*stem_heigth_coeff, $fn=3);
    
    // text
    // translate([d/2-wall_thickness/6, d/8, end_length]) rotate([180,-90,0]) reed2_text(total_length, end_length, d, heigth_cut_prcnt, "-", wall_thickness);
    
    // // round clip
    // difference() {
    //     rotate([0,0,180-(90)/2*360/100]) translate([0,0,end_length]) partial_pipe(total_length/10, d_out+0.8, 0.6, completeness_percent=90);
    //     rotate([0,0,180-(completeness_percent)/2*360/100]) translate([0,0,end_length]) translate([0,0,-0.05]) partial_pipe(total_length/10+0.1, d_out+0.81, 0.61, completeness_percent=completeness_percent);
    // }
}

module reed2_text(total_length, end_length, d, heigth_cut_prcnt, leaf_degree, wall_thickness) {
    my_text = str("L", total_length, " EL", end_length, " D", d, " HC", heigth_cut_prcnt, " LD", leaf_degree);
    linear_extrude(wall_thickness) text(my_text, size = (total_length - end_length)/24);
}

module reed2(total_length, end_length, d, heigth_cut_prcnt, leaf_degree) {
    halved_leaf_degree = leaf_degree/2;
    d_out = d+2*wall_thickness;

    // first part: plug
    translate([0,0,end_length]) reed_plug(total_length, end_length, d);

    // main part
    difference() {
        reed2_base_flat_cut(total_length, end_length, d, heigth_cut_prcnt); // just a flat cut
        reed2_cut(total_length, d, heigth_cut_prcnt, halved_leaf_degree); // deeper cut, half of the leaf degree is added here
    }

    // // grips

    //     // vertical grip
    //     difference() {
    //         rotate([0,0,180-(completeness_percent)/2*360/100]) translate([0,0,end_length+reed_plug_overhang_suppressor_len]) partial_pipe(total_length/10, d_out+0.8, 0.41, completeness_percent=completeness_percent);
    //         rotate([0,0,180-(completeness_percent-10)/2*360/100]) translate([0,0,end_length+reed_plug_overhang_suppressor_len]) translate([0,0,-0.005]) partial_pipe(total_length/10+0.01, d_out+0.81, 0.41, completeness_percent=completeness_percent-10);
    //     }

        // horizontal grip - powstrzymuje klej!!!
        difference() {
            translate([0,0,end_length+reed_plug_overhang_suppressor_len+total_length/10]) {
                difference() {
                    cylinder(h=reed_plug_overhang_suppressor_len,d1=d_out*1.2,d2=d);
                    translate([0,0,-eps/2]) cylinder(h=2+eps,d=d);
                }
            }
            reed2_base_flat_cutting_cube(d, variants_reed_pipe_cut_prcnt, total_length);
        }
}
// main file
include <reed/reed_2_0_0.scad>
include <variants-reed-pipe.scad>

$fn=100;

reed2(
    variants_reed_pipe_length,
    variants_reed_pipe_end_length,
    variants_reed_pipe_in_diameter,
    variants_reed_pipe_cut_prcnt,
    variants_reed_pipe_leaf_degree
);
